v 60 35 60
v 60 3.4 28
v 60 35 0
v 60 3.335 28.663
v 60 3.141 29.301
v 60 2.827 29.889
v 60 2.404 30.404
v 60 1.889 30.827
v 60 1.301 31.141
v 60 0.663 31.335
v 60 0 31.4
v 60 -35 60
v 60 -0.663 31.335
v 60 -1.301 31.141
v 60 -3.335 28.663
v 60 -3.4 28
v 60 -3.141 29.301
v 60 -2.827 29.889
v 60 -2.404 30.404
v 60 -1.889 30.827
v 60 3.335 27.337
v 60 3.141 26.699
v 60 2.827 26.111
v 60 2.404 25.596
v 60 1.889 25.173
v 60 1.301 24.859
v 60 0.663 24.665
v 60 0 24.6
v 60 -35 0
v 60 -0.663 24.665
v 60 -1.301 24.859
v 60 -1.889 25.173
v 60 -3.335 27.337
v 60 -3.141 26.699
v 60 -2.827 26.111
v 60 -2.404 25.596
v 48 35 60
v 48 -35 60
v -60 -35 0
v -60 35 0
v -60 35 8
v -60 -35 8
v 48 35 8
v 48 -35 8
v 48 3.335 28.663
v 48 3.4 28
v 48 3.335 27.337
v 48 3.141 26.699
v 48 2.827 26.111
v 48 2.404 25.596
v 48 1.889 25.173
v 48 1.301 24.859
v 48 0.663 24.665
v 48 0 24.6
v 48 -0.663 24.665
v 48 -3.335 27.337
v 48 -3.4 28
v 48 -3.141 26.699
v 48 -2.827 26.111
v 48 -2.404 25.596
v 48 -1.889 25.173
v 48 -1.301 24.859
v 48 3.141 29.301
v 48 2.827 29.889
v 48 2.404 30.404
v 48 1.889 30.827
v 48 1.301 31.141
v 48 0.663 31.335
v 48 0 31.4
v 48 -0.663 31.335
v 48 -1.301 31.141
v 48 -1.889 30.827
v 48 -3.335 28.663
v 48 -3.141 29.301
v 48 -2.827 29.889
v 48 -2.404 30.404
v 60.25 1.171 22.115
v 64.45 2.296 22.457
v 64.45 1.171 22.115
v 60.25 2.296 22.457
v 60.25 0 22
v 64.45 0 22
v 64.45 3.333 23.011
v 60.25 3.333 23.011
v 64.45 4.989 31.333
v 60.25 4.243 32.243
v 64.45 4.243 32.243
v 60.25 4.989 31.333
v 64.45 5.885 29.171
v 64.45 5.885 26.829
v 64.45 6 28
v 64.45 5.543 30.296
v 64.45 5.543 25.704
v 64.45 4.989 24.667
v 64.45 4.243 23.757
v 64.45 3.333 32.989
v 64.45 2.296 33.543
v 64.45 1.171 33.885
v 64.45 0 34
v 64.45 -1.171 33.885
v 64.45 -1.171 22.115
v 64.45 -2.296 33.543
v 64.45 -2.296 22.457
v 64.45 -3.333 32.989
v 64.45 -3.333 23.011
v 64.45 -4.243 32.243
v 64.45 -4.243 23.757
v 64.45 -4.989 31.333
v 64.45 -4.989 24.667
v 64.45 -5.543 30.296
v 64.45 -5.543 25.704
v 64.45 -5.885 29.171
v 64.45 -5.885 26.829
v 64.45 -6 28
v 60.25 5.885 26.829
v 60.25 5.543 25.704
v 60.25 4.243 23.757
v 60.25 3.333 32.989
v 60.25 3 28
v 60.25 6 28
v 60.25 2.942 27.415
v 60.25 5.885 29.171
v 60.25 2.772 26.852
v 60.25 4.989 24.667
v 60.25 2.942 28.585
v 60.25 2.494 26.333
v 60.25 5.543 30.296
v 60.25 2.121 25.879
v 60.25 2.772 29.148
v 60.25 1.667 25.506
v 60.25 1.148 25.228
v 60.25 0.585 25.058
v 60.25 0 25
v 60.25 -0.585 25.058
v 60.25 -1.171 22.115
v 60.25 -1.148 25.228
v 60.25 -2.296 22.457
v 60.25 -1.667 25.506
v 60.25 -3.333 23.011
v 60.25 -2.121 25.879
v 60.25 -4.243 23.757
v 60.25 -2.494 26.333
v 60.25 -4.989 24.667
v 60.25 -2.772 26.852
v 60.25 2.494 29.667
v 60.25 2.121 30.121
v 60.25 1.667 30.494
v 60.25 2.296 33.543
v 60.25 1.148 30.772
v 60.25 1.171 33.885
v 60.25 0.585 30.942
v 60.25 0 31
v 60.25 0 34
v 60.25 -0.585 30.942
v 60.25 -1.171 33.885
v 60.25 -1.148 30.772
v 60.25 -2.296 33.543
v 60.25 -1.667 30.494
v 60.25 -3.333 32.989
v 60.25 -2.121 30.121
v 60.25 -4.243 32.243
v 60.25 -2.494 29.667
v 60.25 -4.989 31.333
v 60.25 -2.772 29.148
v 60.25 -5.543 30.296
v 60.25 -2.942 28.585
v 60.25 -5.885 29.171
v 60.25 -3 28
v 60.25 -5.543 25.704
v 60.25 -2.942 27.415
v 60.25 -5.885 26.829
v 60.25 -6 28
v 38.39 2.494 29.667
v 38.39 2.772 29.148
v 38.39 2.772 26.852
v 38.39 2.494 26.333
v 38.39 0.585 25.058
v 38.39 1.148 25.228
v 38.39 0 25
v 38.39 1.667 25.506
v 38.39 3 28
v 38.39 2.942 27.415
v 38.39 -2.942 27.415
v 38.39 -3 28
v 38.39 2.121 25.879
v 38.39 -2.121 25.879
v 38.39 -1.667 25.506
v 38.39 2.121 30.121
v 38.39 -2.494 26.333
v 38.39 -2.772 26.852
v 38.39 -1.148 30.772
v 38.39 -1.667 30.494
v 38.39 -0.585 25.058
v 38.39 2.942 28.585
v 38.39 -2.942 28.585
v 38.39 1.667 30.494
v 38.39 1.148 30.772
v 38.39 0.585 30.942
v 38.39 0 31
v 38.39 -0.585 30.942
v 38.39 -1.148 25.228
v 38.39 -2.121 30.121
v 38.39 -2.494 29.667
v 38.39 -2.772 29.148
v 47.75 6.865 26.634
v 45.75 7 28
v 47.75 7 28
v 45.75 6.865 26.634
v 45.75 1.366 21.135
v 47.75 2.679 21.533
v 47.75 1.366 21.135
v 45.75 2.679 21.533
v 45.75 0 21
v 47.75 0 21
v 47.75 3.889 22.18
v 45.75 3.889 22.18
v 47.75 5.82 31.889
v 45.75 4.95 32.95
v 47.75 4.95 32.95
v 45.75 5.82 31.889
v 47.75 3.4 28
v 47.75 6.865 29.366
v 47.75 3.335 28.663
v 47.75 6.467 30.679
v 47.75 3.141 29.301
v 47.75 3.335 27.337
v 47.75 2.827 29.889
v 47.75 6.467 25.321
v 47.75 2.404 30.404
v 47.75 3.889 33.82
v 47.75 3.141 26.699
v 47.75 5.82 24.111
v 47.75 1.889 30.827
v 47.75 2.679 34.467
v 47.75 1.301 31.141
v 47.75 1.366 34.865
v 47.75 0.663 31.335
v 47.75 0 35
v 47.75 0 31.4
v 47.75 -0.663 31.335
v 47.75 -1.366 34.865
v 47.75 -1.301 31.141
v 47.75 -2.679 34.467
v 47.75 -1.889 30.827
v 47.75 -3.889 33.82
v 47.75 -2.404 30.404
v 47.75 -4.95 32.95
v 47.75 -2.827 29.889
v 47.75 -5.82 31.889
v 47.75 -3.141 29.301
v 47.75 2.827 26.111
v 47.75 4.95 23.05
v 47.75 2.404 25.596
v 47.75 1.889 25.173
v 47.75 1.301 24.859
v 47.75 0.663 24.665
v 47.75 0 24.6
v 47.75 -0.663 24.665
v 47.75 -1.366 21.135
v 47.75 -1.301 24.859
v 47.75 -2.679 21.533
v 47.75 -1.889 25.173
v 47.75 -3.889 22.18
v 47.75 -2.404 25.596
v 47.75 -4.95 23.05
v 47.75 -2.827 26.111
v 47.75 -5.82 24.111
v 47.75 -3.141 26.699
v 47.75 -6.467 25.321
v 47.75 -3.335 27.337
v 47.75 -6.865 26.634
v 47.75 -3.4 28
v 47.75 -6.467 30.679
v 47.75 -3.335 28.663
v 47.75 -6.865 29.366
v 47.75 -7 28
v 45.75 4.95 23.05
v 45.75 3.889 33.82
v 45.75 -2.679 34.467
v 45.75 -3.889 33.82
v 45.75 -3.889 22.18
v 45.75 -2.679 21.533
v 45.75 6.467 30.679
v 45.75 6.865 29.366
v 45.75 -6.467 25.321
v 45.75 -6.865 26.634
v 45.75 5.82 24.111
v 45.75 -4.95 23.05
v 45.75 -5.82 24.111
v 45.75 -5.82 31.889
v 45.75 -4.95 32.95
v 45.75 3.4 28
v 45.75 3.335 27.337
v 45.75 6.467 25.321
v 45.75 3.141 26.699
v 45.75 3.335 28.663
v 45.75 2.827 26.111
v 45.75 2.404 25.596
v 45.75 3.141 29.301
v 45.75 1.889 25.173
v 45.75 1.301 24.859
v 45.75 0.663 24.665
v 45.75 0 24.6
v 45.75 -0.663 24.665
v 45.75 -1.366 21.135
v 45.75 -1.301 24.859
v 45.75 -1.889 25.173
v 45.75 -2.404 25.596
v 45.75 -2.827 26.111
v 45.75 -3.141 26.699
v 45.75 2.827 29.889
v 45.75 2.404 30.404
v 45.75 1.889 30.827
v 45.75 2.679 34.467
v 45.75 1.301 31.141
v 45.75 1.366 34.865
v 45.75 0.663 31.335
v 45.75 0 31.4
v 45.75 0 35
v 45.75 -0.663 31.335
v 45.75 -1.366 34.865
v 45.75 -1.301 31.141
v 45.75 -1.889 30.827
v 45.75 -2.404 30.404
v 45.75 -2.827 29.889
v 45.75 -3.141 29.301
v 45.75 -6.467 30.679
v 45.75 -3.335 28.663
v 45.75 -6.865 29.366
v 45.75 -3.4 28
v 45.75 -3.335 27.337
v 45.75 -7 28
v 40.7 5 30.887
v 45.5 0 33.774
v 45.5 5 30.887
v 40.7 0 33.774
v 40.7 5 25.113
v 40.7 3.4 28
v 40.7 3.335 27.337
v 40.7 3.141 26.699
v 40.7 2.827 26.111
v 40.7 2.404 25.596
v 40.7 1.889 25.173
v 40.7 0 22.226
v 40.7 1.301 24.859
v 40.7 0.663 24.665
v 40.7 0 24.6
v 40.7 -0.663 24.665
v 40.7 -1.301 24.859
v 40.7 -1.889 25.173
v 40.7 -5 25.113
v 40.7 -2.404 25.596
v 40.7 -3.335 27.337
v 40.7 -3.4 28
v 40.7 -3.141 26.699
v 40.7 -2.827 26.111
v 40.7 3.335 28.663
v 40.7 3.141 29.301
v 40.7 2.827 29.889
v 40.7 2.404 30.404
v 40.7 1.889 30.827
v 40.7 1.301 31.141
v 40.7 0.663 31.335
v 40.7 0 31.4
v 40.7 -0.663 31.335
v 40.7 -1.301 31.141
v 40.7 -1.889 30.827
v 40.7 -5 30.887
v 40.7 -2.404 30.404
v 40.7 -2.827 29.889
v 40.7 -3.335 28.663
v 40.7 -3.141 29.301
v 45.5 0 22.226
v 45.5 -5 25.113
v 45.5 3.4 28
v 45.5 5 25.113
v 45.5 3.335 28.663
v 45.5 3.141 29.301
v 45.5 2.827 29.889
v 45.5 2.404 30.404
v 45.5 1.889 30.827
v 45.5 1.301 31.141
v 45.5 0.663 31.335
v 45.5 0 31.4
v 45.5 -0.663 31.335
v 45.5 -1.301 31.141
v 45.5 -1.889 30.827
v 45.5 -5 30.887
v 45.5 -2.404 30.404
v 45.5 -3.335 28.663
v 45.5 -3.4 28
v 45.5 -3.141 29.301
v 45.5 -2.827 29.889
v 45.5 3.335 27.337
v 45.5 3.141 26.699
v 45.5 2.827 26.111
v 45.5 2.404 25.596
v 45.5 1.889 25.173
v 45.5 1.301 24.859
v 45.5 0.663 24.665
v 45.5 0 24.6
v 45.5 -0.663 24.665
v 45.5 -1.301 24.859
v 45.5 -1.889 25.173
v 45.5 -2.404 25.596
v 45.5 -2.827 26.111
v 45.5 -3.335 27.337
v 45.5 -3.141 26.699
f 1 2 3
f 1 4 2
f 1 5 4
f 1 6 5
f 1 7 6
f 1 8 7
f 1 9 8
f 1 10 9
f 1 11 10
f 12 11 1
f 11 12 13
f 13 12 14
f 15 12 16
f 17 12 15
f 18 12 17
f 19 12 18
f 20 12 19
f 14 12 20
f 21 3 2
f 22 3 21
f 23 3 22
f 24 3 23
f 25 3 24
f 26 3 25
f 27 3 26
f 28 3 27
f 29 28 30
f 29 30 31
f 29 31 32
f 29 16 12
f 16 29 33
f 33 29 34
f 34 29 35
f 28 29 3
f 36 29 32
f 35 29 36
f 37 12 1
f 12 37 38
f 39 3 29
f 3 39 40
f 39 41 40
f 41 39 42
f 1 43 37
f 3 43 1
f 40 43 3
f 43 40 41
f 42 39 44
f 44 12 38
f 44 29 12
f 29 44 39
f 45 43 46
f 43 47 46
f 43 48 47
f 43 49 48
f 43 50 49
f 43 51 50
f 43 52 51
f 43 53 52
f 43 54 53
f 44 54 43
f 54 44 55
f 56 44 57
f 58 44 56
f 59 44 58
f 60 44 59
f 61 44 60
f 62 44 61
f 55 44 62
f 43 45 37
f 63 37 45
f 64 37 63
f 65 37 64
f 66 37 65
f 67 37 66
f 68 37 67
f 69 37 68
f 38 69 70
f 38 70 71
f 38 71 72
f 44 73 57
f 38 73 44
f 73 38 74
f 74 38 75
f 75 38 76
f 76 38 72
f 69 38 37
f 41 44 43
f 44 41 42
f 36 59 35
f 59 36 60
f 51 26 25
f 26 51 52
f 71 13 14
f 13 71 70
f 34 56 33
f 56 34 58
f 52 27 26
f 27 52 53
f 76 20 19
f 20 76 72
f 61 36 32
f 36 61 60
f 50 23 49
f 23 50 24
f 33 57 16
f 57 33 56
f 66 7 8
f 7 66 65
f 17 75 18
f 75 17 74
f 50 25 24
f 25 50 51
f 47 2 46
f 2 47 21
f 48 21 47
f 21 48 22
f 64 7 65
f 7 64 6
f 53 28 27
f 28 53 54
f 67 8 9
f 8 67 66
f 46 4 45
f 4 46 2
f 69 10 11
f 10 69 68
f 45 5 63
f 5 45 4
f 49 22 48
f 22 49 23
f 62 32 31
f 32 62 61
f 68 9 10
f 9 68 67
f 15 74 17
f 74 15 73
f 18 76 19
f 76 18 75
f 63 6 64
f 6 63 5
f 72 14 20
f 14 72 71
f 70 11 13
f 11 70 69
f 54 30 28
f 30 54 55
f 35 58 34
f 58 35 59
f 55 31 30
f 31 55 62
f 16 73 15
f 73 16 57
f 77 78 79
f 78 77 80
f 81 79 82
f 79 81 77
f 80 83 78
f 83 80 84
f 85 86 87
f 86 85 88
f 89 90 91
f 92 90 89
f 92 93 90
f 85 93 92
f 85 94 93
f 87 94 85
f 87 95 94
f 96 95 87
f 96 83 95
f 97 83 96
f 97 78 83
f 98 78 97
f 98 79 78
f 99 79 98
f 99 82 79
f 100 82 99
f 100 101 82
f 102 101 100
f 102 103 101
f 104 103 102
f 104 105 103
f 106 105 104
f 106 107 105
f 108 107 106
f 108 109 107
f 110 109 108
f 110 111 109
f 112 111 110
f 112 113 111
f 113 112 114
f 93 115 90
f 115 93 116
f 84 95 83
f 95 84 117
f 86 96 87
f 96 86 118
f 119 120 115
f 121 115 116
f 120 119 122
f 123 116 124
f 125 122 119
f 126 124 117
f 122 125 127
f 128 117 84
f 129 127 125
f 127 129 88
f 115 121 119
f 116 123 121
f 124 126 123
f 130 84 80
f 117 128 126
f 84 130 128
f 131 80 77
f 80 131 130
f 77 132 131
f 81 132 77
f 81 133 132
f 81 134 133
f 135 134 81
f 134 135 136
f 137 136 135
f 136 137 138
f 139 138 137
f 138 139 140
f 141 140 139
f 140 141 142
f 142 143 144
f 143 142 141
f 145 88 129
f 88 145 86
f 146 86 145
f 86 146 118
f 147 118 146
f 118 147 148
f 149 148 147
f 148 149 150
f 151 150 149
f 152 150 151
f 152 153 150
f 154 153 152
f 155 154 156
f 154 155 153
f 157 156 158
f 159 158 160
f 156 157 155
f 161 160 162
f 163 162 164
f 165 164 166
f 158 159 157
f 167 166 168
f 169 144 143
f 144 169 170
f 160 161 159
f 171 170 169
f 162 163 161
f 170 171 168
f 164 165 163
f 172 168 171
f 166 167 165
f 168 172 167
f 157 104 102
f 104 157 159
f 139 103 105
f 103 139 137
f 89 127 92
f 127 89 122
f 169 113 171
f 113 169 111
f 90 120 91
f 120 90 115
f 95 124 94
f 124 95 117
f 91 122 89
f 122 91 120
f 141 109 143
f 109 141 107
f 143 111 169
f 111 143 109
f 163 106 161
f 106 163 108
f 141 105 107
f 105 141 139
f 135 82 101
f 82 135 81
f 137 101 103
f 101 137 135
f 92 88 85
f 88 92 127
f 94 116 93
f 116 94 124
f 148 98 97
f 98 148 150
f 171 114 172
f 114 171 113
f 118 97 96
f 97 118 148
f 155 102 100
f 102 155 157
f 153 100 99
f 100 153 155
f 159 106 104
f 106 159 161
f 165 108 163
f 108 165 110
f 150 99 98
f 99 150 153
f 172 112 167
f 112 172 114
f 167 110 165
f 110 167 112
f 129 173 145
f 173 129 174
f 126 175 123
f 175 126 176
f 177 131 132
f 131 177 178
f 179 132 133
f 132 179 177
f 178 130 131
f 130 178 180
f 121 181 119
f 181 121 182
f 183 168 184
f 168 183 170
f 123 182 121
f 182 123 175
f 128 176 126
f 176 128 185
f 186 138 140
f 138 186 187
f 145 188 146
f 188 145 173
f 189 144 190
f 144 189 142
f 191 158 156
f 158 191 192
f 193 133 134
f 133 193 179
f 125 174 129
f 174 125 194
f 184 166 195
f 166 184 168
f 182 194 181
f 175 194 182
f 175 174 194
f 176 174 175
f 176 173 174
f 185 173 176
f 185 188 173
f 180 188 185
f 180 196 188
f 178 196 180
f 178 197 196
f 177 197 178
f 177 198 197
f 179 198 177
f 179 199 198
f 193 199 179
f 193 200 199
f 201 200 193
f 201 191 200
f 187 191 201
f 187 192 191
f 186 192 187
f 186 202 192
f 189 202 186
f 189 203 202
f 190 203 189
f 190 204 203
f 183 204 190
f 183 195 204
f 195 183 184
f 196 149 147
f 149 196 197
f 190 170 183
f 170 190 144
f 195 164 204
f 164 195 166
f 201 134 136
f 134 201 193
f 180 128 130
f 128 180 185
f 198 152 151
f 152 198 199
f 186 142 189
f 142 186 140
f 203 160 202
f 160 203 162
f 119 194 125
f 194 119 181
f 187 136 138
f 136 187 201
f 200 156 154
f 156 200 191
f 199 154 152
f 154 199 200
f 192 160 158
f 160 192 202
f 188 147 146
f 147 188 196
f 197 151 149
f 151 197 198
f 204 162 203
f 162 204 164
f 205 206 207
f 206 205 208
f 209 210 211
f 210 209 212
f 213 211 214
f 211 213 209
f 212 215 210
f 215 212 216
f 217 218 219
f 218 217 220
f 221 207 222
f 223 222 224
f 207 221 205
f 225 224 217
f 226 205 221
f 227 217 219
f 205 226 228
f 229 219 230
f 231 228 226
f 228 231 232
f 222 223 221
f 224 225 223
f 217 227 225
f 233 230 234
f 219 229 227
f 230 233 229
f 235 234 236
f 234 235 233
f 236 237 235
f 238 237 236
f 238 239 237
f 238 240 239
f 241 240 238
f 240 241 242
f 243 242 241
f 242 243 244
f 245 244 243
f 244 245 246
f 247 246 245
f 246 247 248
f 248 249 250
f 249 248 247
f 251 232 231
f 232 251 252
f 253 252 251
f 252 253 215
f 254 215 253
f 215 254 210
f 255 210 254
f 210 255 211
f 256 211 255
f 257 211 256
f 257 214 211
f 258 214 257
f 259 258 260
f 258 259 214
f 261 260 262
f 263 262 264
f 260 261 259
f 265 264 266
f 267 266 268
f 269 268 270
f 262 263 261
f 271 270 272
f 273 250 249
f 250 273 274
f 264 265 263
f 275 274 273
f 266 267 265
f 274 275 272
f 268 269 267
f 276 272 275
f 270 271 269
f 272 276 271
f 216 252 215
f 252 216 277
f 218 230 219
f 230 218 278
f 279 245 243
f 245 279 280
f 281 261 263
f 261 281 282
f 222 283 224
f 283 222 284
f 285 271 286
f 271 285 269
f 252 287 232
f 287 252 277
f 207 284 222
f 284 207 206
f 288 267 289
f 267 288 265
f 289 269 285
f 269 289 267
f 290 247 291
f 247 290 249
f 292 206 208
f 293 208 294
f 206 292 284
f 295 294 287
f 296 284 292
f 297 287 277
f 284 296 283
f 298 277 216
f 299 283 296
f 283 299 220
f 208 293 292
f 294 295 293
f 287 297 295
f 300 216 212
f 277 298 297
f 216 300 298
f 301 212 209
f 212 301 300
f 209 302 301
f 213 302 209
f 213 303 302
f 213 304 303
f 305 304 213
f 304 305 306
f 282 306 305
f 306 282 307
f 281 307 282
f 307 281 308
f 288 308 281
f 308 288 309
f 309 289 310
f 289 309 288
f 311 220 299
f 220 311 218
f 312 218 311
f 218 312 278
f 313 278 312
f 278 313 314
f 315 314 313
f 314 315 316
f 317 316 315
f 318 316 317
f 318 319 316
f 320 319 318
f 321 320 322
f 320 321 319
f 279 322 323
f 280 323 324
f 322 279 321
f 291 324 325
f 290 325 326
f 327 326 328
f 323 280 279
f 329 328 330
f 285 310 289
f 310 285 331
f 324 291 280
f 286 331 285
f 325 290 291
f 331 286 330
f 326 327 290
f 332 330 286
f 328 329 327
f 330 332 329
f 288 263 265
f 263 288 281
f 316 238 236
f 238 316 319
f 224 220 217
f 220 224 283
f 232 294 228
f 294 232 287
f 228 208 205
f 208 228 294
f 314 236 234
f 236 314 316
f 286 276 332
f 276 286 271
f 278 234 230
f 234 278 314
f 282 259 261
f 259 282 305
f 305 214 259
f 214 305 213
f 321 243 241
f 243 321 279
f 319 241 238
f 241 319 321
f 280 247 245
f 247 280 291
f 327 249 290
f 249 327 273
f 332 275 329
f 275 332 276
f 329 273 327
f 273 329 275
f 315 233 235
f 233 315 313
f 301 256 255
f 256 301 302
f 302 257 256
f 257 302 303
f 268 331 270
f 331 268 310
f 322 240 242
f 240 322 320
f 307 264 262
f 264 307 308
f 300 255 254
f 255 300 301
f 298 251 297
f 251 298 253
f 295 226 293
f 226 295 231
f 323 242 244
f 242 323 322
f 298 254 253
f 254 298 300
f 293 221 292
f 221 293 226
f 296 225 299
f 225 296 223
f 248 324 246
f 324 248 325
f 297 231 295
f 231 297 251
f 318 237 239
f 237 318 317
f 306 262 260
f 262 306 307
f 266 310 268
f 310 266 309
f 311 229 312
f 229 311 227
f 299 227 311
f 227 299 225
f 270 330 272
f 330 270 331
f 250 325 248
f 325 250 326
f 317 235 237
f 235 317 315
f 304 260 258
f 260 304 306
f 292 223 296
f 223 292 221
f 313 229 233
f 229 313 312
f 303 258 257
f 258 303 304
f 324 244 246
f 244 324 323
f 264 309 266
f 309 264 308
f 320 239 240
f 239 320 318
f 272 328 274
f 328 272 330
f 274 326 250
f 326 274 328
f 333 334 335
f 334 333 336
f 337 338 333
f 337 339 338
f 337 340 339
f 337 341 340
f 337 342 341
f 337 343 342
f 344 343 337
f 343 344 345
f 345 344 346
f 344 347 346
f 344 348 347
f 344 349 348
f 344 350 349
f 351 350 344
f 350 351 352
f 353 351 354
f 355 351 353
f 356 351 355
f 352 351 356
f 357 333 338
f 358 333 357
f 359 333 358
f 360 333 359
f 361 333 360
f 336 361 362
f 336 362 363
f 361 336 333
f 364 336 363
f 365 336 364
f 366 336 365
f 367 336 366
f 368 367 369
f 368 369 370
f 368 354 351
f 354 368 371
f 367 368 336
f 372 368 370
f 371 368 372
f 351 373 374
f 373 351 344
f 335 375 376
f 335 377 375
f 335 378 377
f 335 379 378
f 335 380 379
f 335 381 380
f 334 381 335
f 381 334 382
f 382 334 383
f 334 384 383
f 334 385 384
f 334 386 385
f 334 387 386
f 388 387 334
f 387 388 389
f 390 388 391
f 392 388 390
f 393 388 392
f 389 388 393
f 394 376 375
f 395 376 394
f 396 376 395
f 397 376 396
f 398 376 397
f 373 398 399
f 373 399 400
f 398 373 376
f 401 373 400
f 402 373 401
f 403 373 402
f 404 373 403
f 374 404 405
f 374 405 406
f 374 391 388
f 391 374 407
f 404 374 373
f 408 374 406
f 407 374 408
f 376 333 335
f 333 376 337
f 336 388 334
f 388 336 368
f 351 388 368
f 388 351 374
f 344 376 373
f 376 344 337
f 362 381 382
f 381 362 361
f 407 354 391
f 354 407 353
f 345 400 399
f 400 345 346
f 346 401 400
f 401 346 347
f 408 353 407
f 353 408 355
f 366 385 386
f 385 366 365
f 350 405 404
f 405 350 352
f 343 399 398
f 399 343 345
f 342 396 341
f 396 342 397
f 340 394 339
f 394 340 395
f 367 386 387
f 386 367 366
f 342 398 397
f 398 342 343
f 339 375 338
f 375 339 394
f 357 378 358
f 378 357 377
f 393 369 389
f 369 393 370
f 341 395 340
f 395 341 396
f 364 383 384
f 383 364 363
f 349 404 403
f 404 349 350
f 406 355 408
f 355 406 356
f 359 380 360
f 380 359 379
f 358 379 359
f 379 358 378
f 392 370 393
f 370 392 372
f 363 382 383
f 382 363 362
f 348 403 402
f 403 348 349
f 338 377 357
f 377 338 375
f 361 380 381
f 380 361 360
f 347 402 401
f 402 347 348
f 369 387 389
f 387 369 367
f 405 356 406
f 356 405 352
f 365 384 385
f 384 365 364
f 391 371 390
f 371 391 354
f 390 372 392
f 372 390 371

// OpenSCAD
$fn = 32;

// ------------------------------------------------------------------------
// Bolted bracket: 120 x 70 mm bracket with 1 bolt joints
// Every part is its own module, assembly() places them once.
// ------------------------------------------------------------------------

// --- part 1 ---
module bracket() {
  difference() {
    translate([-60, -35, 0]) cube([120, 70, 60]);
    translate([-61, -36, 8]) cube([109, 72, 53]);
    translate([54, 0, 28]) rotate([0, 90, 0]) cylinder(h = 14, d = 6.8, center = true);
  }
}

// --- part 2 ---
module bolt() {
  cylinder(h = 4.2, d = 12);
  translate([0, 0, -21.86]) cylinder(h = 21.86, d = 6);
}

// --- part 3 ---
module washer() {
  difference() {
      translate([0, 0, 0]) cylinder(h = 2, d = 14);
      translate([0, 0, -1]) cylinder(h = 4, d = 6.8);
    }
}

// --- part 4 ---
module nut() {
  difference() {
    linear_extrude(height = 4.8) polygon(points = [[5.774, 0], [2.887, 5], [-2.887, 5], [-5.774, 0], [-2.887, -5], [2.887, -5]]);
    translate([0, 0, -1]) cylinder(h = 6.8, d = 6.8);
  }
}

// --- assembly ---
module assembly() {
  translate([0, 0, 0]) rotate([0, 0, 0]) bracket();
  translate([60.25, 0, 28]) rotate([0, 90, 0]) bolt();
  translate([45.75, 0, 28]) rotate([0, 90, 0]) washer();
  translate([40.7, 0, 28]) rotate([0, 90, 0]) nut();
}

assembly();
